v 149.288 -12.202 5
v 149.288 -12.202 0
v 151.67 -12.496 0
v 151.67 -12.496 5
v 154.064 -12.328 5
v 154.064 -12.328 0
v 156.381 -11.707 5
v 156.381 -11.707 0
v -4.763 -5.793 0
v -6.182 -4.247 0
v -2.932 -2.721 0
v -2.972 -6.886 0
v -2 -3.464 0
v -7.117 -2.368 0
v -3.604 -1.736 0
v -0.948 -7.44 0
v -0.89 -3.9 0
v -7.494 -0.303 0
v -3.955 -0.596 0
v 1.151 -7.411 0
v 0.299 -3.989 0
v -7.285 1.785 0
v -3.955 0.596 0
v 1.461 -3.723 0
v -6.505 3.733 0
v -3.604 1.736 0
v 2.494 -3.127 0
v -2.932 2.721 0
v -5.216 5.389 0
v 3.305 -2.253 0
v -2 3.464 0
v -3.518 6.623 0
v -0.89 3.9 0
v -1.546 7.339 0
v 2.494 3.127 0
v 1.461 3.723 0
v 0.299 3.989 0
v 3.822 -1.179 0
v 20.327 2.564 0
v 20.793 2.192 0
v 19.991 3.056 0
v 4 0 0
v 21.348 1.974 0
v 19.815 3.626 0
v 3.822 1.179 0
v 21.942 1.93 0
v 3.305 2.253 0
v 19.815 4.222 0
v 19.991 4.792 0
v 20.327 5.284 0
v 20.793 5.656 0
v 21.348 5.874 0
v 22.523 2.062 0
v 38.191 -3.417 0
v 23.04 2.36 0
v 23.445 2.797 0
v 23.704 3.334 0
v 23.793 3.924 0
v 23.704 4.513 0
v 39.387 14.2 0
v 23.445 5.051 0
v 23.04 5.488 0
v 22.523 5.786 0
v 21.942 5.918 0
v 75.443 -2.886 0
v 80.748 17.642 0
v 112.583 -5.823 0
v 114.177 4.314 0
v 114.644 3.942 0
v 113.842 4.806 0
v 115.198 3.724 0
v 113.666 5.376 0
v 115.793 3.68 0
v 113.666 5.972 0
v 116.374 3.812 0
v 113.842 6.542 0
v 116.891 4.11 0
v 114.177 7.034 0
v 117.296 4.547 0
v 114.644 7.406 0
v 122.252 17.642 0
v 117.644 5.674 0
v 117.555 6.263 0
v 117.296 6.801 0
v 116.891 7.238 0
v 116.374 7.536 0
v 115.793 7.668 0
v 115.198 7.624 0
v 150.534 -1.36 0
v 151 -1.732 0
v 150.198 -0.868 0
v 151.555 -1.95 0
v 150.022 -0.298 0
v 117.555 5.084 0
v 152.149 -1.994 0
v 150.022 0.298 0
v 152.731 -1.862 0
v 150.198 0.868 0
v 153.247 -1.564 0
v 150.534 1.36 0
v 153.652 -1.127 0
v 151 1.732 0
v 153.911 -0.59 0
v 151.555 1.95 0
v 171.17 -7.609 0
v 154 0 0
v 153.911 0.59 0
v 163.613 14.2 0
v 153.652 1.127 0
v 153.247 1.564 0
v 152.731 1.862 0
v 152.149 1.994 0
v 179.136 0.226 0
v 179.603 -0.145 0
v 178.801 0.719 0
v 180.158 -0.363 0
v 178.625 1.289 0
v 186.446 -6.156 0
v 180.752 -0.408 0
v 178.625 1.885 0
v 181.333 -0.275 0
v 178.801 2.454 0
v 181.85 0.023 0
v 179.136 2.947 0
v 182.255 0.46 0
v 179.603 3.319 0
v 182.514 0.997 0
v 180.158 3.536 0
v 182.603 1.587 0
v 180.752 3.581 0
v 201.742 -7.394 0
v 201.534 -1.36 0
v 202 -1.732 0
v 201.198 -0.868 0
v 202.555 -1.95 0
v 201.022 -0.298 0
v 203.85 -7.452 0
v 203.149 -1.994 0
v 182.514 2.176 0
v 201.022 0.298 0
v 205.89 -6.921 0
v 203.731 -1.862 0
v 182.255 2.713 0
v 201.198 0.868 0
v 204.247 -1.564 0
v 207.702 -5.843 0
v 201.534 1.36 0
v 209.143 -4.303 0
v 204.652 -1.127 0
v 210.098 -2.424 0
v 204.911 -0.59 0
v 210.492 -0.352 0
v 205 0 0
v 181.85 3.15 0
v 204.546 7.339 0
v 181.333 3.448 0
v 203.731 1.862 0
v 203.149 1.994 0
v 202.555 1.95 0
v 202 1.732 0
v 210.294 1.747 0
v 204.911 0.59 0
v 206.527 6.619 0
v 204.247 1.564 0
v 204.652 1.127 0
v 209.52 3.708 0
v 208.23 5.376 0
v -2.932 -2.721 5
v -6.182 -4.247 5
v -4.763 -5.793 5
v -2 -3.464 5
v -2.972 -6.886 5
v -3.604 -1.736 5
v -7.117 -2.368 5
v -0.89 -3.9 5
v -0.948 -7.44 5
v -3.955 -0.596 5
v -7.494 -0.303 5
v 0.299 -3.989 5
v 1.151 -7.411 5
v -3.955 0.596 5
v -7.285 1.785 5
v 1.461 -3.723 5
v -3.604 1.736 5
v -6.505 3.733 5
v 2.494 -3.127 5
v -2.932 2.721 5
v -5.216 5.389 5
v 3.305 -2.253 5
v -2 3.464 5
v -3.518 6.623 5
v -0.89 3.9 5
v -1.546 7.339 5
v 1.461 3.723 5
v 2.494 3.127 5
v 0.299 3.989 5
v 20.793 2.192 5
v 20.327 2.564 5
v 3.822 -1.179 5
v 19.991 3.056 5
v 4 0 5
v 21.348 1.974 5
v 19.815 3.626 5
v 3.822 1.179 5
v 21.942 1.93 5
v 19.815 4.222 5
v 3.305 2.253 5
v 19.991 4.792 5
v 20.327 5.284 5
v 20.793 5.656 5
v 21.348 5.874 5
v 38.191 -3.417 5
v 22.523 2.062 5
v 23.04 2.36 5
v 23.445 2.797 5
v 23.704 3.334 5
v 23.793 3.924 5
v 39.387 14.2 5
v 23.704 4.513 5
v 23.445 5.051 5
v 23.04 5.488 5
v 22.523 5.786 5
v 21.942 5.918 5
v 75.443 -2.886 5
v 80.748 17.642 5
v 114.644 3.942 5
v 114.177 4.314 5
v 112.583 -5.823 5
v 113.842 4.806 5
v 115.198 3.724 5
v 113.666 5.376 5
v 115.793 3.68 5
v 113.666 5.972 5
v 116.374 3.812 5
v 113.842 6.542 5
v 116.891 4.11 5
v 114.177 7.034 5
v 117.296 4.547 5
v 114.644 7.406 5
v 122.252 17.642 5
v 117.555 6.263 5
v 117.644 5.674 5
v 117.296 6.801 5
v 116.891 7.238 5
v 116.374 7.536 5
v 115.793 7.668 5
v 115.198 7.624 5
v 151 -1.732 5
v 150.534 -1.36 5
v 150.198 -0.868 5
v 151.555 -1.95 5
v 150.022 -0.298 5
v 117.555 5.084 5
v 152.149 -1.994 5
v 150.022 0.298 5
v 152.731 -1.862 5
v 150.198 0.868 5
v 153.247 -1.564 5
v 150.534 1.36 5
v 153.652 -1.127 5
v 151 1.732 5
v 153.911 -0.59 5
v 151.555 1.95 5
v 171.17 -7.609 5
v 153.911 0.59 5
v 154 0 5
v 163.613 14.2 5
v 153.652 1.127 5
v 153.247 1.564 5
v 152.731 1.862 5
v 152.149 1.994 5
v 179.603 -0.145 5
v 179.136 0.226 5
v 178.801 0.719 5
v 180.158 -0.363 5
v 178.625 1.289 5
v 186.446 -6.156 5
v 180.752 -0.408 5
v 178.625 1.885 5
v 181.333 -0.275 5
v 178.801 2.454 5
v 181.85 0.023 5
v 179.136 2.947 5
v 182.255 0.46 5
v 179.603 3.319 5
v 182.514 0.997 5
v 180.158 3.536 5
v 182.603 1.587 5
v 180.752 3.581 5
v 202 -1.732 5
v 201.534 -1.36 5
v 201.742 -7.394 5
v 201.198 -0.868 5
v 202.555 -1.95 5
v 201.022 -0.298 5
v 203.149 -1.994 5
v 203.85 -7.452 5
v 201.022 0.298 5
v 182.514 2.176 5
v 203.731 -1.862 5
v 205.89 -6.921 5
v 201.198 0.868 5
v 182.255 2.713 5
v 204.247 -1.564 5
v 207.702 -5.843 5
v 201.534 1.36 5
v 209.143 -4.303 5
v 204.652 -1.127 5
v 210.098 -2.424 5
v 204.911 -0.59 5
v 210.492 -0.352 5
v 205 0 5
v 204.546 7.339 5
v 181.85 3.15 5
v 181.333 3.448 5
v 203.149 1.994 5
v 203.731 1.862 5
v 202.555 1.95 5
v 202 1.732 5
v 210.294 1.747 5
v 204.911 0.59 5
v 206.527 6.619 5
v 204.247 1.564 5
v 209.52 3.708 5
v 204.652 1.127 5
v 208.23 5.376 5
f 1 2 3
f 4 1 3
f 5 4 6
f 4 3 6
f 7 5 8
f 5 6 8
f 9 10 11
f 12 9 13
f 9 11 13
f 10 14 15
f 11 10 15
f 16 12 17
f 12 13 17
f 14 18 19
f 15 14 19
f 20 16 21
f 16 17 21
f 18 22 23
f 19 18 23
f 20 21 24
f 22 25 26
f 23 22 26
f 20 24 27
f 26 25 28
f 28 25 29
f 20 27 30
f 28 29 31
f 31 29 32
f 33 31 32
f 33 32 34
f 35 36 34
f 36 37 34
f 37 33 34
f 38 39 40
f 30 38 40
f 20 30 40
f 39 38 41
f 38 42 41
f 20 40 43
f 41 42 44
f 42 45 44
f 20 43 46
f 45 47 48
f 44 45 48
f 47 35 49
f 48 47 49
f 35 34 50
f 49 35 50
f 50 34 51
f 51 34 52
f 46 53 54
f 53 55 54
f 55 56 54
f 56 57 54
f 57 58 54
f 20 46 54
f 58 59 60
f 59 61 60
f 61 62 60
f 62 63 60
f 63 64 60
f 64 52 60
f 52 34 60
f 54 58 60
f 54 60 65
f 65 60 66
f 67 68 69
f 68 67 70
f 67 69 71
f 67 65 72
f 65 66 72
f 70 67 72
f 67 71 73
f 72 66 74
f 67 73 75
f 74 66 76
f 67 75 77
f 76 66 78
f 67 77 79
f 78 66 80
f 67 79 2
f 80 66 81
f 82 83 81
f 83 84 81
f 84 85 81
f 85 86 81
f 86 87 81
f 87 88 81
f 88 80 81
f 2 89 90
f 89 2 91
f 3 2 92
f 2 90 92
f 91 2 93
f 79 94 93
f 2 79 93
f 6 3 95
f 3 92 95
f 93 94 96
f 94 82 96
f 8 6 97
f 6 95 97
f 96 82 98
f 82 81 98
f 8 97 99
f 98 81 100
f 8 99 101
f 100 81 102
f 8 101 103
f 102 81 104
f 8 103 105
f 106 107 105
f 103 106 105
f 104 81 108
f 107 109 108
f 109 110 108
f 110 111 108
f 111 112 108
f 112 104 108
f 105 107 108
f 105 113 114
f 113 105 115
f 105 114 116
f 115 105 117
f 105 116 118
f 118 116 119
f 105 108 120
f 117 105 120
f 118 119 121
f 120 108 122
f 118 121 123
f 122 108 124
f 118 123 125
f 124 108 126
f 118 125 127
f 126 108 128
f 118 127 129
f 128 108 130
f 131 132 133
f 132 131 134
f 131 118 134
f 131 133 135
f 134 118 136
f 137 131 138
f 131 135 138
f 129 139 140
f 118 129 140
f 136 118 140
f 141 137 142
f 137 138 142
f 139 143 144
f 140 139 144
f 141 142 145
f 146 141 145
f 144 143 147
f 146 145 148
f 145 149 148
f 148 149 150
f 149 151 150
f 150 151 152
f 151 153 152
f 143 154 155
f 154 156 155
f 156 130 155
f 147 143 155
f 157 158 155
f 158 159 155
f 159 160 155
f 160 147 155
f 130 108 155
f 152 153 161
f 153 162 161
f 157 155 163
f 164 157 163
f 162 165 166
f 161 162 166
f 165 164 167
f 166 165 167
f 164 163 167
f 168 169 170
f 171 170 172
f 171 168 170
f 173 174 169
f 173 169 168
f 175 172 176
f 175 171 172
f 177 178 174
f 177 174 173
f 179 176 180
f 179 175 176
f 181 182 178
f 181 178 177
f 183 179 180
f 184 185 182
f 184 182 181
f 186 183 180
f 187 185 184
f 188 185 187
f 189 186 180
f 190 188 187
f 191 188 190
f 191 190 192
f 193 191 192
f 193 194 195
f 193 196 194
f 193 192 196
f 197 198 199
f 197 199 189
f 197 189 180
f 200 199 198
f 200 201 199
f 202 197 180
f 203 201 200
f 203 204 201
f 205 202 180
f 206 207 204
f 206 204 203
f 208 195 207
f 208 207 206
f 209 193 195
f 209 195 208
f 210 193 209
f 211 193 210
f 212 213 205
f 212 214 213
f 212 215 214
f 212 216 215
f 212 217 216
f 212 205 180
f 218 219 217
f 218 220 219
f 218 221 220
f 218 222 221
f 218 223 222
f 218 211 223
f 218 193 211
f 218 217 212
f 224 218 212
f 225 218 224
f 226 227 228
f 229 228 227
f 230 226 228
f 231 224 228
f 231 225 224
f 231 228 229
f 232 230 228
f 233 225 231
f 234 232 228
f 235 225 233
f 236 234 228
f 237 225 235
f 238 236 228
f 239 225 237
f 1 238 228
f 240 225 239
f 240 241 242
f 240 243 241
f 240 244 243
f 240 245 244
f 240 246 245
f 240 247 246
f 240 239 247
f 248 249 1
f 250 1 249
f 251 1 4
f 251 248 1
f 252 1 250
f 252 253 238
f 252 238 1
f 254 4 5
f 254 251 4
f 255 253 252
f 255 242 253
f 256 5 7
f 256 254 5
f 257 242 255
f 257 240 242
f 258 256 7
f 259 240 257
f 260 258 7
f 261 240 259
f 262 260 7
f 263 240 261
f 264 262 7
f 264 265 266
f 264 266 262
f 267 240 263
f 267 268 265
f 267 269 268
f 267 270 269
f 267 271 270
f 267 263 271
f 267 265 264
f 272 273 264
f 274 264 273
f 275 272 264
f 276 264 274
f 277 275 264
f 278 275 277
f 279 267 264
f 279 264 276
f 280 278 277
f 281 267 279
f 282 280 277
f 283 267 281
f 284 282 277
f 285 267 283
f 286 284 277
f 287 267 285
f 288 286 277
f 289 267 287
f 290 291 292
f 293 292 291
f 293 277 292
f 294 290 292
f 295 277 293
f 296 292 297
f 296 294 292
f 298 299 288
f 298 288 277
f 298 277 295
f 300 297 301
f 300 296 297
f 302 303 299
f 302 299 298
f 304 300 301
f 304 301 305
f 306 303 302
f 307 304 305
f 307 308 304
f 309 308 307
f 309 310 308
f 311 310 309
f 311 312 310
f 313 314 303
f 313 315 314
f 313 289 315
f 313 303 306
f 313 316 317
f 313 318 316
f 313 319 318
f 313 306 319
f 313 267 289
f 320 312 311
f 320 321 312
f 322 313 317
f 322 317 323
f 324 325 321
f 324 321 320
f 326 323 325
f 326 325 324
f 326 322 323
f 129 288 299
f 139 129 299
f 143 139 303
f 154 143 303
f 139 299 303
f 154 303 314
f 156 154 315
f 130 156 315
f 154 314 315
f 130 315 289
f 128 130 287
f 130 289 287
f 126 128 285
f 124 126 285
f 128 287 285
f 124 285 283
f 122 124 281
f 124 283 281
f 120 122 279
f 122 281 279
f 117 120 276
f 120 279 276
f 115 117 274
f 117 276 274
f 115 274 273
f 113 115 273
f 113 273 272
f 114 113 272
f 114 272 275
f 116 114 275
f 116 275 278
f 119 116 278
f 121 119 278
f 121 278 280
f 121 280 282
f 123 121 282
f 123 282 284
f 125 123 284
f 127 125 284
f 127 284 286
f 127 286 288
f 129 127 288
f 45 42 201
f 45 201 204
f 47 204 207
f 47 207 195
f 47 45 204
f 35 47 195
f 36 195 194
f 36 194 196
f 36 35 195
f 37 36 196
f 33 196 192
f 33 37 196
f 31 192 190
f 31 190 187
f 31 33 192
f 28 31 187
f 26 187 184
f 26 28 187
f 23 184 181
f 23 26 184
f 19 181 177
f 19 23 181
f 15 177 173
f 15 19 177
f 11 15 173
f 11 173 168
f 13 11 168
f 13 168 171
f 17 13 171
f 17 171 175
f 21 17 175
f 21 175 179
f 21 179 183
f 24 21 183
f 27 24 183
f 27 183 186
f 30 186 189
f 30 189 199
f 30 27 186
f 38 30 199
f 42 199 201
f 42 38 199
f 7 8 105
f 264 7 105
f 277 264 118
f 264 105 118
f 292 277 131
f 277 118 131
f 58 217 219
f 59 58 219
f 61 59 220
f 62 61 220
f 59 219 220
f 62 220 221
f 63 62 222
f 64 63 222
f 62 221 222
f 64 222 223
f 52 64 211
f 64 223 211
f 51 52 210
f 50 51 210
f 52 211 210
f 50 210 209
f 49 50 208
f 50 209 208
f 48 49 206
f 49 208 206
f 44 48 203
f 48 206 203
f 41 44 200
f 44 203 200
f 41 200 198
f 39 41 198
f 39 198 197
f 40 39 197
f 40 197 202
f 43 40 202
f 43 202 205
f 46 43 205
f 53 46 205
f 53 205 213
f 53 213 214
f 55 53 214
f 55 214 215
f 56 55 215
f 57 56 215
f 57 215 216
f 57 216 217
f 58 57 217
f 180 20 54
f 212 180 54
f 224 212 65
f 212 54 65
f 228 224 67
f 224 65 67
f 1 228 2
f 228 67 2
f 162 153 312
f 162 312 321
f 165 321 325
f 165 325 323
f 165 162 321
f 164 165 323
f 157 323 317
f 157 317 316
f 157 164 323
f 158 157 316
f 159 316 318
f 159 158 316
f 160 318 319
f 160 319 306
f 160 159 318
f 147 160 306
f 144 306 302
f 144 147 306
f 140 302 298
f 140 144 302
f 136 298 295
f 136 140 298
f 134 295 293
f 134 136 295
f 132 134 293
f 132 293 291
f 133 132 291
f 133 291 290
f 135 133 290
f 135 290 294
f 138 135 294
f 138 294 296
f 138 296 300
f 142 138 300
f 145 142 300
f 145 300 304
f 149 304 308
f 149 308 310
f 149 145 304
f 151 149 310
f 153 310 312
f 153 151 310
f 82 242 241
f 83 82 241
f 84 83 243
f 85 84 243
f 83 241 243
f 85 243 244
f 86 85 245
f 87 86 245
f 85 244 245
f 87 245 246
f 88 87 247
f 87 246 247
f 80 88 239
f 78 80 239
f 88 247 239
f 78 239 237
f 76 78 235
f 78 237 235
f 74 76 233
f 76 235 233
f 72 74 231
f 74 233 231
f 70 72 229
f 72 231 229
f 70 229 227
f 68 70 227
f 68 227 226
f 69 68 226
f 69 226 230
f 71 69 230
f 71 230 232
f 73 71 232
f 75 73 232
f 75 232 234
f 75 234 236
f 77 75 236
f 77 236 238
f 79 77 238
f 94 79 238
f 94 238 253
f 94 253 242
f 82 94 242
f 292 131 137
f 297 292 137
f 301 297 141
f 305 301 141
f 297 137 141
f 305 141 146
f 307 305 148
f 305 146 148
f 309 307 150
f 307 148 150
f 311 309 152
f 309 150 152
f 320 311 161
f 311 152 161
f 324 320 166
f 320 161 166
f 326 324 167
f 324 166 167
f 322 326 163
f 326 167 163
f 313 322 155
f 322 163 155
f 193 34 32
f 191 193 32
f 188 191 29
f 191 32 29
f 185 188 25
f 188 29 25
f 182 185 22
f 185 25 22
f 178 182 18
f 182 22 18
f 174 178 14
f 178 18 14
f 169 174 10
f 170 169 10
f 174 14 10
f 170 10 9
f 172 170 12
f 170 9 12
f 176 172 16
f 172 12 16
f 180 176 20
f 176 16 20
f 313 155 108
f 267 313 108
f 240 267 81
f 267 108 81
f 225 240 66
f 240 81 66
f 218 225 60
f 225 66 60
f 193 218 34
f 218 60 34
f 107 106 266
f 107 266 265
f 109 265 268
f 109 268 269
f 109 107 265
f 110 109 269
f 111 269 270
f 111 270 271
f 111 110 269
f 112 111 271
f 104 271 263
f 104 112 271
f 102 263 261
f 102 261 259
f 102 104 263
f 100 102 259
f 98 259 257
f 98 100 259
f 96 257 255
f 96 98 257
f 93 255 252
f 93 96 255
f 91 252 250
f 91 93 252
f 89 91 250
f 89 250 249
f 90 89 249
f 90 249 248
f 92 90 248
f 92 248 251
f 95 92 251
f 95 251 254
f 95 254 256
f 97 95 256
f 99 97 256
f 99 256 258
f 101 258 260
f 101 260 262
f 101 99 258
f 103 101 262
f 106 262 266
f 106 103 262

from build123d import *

# Parameters (mm, degrees)
SCHIZZO1_R                   = 4
SCHIZZO1_R_2                 = 2
ESTRUSIONE_ESTRUSIONE1_DEPTH = 5
SCHIZZO2_R                   = 2
TAGLIO_ESTRUSIONE1_DEPTH     = 10


with BuildPart() as part:
    # Schizzo1 → Estrusione-Estrusione1 (new body)
    with BuildSketch(Plane.XY):
        with BuildLine():
            ThreePointArc((-1.545685279, 7.338995641), (-7.37775549, -1.348600733), (1.150548918, -7.411223731))
            ThreePointArc((1.150548918, -7.411223731), (75.443261143, -2.885528453), (149.288277512, -12.20231786))
            ThreePointArc((149.288277512, -12.20231786), (152.870711747, -12.469637567), (156.381230514, -11.707041436))
            ThreePointArc((156.381230514, -11.707041436), (178.7761584, -6.547142951), (201.742232266, -7.393782545))
            ThreePointArc((201.742232266, -7.393782545), (210.367795627, -1.401994151), (204.545685279, 7.338995641))
            ThreePointArc((204.545685279, 7.338995641), (101.5, 18.072619578), (-1.545685279, 7.338995641))
        make_face()
        Circle(SCHIZZO1_R, mode=Mode.SUBTRACT)
        with Locations((203, 0)):
            Circle(SCHIZZO1_R_2, mode=Mode.SUBTRACT)
        with Locations((152, 0)):
            Circle(SCHIZZO1_R_2, mode=Mode.SUBTRACT)
    extrude(amount=ESTRUSIONE_ESTRUSIONE1_DEPTH)

    # Schizzo2 → Taglio-Estrusione1 (cut)
    with BuildSketch(Plane.XY.offset(5)):
        with Locations((21.792647349, 3.923925867)):
            Circle(SCHIZZO2_R)
        with Locations((115.643522851, 5.673925867)):
            Circle(SCHIZZO2_R)
        with Locations((180.602574062, 1.58663817)):
            Circle(SCHIZZO2_R)
    extrude(amount=-TAGLIO_ESTRUSIONE1_DEPTH, mode=Mode.SUBTRACT)


solid = part.part
